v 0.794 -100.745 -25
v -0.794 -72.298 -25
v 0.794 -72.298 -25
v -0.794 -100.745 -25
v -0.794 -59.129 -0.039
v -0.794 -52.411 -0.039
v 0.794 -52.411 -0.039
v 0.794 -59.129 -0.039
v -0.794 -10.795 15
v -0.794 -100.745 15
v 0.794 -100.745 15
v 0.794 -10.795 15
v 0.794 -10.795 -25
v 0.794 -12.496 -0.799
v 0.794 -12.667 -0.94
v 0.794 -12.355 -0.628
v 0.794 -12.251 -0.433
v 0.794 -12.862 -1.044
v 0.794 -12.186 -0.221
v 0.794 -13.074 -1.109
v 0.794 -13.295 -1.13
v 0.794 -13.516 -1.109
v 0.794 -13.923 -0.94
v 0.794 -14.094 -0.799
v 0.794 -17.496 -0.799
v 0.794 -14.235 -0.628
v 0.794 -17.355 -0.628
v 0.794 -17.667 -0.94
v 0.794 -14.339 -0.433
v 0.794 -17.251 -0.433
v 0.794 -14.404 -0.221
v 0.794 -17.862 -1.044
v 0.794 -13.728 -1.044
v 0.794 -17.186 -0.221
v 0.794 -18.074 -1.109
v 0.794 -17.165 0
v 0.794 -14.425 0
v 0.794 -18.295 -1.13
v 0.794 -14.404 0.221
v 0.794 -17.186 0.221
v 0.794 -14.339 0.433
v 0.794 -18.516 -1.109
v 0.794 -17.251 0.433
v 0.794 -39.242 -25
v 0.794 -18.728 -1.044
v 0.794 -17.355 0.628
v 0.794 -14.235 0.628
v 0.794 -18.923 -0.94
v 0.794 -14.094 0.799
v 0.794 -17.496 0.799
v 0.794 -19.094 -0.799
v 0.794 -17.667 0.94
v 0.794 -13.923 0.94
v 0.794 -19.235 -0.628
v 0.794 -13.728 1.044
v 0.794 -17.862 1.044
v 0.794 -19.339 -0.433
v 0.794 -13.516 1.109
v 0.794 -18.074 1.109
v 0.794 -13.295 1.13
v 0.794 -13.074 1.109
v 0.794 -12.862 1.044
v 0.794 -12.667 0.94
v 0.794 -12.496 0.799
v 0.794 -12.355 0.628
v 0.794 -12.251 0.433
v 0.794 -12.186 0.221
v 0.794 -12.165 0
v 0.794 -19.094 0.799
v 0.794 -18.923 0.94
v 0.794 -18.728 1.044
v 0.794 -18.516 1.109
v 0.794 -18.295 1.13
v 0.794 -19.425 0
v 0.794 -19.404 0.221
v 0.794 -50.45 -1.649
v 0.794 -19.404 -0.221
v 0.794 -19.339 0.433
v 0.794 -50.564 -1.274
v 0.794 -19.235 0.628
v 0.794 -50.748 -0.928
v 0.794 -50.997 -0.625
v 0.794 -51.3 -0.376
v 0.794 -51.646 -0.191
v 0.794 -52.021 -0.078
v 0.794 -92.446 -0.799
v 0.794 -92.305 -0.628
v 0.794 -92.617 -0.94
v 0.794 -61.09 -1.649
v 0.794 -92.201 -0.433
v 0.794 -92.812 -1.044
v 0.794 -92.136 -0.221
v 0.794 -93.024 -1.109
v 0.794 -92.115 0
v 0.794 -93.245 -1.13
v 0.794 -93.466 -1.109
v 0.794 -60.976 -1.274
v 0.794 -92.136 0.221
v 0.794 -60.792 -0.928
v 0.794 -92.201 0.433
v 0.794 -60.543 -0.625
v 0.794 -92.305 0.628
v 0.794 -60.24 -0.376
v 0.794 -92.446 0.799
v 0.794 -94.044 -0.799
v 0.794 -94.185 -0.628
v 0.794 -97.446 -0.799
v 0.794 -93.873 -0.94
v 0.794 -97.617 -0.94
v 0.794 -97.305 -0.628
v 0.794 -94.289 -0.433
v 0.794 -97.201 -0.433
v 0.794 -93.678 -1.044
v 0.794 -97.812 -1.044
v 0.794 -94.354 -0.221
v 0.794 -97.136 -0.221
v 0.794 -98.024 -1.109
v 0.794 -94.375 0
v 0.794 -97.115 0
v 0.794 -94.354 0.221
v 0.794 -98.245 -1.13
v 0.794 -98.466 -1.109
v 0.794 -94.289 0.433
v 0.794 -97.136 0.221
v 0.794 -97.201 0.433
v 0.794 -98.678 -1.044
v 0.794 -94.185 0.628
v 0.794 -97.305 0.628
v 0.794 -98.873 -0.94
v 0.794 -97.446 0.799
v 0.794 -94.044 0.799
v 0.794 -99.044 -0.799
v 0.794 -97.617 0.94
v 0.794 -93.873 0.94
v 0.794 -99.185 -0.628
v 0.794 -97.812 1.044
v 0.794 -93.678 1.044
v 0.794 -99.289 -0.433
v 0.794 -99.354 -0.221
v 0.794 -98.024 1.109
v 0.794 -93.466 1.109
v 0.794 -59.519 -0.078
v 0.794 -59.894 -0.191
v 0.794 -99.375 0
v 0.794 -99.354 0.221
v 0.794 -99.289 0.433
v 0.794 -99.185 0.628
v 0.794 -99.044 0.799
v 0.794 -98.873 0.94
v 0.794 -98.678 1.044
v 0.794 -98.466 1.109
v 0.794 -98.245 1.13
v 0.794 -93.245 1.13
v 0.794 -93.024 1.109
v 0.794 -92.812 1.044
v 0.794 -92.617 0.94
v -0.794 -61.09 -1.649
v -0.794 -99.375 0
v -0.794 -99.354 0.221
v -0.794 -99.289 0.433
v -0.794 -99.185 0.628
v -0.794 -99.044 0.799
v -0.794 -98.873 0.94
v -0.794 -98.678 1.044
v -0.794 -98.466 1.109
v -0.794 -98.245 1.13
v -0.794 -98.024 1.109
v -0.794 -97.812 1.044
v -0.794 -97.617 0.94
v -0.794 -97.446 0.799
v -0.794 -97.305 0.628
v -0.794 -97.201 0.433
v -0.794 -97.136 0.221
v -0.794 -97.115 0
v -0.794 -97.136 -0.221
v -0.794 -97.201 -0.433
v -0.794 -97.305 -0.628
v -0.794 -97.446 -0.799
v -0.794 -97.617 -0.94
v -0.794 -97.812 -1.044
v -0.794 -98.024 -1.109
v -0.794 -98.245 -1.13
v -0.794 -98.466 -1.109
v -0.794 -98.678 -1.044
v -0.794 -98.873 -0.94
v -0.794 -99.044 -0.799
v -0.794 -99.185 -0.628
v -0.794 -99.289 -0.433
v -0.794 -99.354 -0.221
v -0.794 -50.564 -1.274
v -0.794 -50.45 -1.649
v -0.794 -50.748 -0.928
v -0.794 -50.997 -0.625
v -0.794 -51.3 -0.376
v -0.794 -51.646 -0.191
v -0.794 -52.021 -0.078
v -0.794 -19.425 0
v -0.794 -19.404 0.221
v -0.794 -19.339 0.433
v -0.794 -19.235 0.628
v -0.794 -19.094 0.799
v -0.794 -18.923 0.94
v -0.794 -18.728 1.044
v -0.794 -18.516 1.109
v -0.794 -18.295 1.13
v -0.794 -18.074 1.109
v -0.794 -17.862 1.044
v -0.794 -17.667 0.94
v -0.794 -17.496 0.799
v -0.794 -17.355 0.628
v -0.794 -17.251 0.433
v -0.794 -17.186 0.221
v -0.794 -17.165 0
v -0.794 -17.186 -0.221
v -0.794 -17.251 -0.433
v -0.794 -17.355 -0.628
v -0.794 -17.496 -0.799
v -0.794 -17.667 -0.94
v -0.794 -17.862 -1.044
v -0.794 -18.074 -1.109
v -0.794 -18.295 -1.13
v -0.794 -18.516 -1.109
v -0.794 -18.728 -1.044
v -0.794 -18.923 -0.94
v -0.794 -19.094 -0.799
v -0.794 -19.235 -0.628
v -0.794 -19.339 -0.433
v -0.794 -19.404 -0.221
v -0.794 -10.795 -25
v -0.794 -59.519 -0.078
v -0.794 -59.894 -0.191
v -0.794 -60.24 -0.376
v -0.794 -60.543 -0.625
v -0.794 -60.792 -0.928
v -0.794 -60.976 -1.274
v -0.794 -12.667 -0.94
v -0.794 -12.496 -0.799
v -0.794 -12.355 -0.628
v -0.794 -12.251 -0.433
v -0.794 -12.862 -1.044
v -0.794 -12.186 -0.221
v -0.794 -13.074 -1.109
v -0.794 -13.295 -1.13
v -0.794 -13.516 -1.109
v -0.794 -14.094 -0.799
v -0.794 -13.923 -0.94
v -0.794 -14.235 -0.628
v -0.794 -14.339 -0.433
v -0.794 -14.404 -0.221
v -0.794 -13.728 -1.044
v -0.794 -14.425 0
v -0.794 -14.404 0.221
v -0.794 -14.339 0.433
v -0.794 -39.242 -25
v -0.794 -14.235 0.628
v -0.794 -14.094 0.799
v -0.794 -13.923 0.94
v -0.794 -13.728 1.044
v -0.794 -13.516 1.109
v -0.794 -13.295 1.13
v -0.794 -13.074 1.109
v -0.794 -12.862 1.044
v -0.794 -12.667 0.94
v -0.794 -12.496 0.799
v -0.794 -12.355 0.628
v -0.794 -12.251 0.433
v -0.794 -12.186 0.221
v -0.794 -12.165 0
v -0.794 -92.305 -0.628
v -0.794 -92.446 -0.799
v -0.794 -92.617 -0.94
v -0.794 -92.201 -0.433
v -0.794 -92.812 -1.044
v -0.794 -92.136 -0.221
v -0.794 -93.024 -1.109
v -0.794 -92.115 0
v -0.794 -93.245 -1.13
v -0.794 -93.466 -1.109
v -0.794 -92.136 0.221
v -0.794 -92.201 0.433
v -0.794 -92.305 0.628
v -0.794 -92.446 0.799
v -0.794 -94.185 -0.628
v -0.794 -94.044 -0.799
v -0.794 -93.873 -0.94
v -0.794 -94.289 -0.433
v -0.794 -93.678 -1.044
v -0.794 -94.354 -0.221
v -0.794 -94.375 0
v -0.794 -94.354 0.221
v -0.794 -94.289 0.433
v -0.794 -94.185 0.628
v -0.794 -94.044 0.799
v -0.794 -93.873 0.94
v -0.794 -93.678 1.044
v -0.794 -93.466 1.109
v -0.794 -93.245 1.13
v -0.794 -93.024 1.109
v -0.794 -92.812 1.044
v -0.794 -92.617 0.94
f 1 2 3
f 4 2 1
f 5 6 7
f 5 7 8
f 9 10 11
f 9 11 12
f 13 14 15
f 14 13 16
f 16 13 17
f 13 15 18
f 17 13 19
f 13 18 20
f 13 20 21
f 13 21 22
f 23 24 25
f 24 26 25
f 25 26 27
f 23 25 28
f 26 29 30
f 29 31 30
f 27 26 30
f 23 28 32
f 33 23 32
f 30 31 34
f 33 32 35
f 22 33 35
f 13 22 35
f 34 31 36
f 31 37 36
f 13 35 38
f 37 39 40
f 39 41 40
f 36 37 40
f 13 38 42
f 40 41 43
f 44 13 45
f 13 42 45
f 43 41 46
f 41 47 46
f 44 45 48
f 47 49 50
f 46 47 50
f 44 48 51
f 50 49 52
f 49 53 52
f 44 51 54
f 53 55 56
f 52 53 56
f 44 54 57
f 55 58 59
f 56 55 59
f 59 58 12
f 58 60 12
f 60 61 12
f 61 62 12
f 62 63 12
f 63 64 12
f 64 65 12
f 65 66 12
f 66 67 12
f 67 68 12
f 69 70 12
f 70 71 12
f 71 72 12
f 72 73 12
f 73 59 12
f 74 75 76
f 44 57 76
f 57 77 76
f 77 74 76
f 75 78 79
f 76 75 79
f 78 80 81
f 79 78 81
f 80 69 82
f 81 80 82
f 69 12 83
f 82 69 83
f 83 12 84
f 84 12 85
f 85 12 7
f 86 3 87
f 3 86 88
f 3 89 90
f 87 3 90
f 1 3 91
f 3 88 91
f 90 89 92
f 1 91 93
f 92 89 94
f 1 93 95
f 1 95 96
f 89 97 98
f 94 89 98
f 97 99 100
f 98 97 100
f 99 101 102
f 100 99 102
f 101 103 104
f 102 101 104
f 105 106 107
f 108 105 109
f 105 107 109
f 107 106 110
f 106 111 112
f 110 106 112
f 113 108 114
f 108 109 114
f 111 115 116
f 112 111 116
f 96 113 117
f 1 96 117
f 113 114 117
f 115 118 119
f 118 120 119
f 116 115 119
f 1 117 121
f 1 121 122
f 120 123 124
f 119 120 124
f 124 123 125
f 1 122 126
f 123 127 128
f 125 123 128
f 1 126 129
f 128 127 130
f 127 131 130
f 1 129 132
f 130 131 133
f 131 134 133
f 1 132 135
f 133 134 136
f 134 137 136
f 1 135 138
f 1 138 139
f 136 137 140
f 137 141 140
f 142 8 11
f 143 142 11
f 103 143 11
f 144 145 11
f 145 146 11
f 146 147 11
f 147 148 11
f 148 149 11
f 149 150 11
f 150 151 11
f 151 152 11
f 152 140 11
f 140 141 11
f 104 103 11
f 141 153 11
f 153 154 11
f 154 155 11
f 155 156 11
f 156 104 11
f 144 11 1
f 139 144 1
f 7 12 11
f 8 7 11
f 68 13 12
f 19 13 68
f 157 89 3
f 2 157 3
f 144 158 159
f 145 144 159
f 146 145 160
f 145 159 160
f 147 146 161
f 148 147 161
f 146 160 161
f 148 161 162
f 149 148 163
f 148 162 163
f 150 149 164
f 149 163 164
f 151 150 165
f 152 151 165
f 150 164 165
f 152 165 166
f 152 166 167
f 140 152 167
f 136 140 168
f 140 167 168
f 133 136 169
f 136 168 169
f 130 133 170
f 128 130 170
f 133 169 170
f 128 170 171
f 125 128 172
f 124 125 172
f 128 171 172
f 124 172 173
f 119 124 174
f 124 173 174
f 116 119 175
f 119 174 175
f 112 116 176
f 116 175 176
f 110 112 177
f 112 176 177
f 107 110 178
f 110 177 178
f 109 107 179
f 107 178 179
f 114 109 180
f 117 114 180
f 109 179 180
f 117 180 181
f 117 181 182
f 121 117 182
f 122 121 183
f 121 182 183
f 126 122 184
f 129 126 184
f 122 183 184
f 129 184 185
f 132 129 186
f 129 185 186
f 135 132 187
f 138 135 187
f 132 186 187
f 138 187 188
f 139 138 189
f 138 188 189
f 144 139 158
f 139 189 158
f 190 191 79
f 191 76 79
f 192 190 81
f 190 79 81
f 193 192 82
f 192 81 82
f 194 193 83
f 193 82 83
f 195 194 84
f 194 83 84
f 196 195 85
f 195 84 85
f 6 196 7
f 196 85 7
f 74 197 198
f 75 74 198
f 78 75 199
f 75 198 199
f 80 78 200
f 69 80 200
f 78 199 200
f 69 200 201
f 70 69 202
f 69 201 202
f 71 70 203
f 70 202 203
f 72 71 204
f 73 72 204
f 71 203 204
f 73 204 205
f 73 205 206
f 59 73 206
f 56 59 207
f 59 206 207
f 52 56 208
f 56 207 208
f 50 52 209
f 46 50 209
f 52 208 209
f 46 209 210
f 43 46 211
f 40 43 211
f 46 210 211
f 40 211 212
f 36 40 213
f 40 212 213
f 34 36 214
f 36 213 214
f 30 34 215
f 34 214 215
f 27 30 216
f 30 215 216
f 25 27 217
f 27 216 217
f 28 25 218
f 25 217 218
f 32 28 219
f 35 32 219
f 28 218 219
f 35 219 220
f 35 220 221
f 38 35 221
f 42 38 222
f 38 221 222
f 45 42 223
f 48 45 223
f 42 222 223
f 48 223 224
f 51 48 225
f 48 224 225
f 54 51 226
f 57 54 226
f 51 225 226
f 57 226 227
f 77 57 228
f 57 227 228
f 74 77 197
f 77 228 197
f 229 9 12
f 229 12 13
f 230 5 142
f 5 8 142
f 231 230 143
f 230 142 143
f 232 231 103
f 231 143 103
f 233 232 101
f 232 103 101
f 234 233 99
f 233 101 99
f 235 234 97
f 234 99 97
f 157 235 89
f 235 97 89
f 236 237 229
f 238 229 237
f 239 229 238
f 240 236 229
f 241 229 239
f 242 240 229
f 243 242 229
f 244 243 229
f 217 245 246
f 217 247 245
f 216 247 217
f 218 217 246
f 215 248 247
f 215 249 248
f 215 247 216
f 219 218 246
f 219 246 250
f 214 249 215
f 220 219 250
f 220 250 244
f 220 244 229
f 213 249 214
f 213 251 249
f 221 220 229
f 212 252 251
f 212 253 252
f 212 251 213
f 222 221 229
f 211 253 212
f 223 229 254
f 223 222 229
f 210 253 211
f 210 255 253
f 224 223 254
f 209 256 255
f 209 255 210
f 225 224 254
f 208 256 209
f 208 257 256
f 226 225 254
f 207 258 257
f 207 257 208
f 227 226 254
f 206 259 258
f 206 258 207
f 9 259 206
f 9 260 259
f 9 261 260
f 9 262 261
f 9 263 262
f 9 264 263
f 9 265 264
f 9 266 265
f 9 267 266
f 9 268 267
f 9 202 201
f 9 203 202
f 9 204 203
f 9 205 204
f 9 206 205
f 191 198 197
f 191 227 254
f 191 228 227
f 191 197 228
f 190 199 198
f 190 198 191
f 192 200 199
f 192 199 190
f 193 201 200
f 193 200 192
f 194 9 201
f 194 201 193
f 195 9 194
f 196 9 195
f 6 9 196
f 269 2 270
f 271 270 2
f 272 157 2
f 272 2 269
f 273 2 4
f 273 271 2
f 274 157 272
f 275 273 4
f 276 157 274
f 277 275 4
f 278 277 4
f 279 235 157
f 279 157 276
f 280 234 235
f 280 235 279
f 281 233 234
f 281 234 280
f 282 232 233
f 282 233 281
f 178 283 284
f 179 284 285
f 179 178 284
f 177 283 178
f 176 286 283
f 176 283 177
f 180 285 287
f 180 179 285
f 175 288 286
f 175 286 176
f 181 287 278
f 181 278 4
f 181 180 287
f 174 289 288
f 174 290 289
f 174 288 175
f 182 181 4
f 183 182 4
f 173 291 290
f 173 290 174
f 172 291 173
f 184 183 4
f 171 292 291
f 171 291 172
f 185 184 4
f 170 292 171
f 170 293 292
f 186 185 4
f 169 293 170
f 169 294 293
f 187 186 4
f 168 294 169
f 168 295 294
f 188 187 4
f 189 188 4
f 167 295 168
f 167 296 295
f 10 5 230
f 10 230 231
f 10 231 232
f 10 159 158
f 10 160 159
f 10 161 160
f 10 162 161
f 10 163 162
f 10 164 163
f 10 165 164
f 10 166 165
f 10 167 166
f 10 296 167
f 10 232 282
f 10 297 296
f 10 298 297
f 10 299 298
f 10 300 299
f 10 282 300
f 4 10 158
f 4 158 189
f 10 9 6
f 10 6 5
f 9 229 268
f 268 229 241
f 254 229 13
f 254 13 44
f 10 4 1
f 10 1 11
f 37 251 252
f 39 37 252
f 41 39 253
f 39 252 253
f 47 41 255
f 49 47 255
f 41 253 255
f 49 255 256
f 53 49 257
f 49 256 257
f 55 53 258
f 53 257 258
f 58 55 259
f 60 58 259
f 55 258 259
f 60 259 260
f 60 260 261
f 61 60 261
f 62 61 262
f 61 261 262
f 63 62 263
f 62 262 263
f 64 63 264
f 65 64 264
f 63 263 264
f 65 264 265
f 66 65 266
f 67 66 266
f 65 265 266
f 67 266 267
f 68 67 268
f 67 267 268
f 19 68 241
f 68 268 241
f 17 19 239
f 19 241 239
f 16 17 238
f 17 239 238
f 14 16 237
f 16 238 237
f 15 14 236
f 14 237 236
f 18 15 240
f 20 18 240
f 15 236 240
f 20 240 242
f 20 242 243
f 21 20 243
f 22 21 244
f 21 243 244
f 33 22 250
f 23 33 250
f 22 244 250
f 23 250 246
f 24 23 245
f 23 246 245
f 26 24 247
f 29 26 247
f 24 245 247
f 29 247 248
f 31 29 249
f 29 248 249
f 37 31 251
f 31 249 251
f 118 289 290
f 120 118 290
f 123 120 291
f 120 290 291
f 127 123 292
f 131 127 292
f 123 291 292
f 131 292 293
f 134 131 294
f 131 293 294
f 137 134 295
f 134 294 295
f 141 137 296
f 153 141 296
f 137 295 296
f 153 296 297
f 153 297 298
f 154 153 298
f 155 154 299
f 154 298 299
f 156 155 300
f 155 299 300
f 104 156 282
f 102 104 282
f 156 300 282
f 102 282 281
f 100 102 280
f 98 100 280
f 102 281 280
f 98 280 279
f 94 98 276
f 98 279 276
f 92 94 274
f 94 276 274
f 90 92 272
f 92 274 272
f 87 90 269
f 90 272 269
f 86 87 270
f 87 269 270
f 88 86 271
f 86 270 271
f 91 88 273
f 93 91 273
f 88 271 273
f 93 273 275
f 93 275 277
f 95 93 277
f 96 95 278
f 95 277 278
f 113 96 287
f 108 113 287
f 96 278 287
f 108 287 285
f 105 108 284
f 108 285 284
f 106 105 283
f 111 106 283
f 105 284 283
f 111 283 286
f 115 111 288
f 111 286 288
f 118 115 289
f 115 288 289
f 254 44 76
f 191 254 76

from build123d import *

# Parameters (mm, degrees)
SKETCH_1_R          = 1.1303
EXTRUDE_1_DEPTH     = 1.588
FILLET_1_R          = 2
FILLET_2_R          = 2
FILLET_3_R          = 2
FILLET_4_R          = 2
SKETCH_2_W          = 12
SKETCH_2_H          = 89.95
EXTRUDE_2_DEPTH     = 1.588
CUT_EXTRUDE_1_DEPTH = 10


with BuildPart() as part:
    # 草图1 → 凸台-拉伸1 (new body)
    with BuildSketch(Plane(origin=(-0.79375, 0, 0), x_dir=(0, -1, 0), z_dir=(-1, 0, 0))):
        with BuildLine():
            Line((38.795, 5), (12.795, 5))
            ThreePointArc((12.795, 5), (11.380786438, 4.414213562), (10.795, 3))
            Line((10.795, 3), (10.795, -13))
            ThreePointArc((10.795, -13), (11.380786438, -14.414213562), (12.795, -15))
            Line((12.795, -15), (47.795, -15))
            Line((47.795, -15), (50.77, -0.039144756))
            Line((50.77, -0.039144756), (55.77, -0.039144756))
            Line((55.77, -0.039144756), (60.77, -0.039144756))
            Line((60.77, -0.039144756), (63.745, -15))
            Line((63.745, -15), (98.745, -15))
            ThreePointArc((98.745, -15), (100.159213562, -14.414213562), (100.745, -13))
            Line((100.745, -13), (100.745, 3))
            ThreePointArc((100.745, 3), (100.159213562, 4.414213562), (98.745, 5))
            Line((98.745, 5), (72.745, 5))
            Line((72.745, 5), (38.795, 5))
        make_face()
        with Locations((18.295, 0)):
            Circle(SKETCH_1_R, mode=Mode.SUBTRACT)
        with Locations((13.295, 0)):
            Circle(SKETCH_1_R, mode=Mode.SUBTRACT)
        with Locations((98.245, 0)):
            Circle(SKETCH_1_R, mode=Mode.SUBTRACT)
        with Locations((93.245, 0)):
            Circle(SKETCH_1_R, mode=Mode.SUBTRACT)
    extrude(amount=-EXTRUDE_1_DEPTH)

    # 圆角1
    fillet_1_edges = [part.edges().sort_by_distance(p)[0] for p in [
        (0.00025, -50.77, -0.039144756),
    ]]
    fillet(fillet_1_edges, radius=FILLET_1_R)

    # 圆角2
    fillet_2_edges = [part.edges().sort_by_distance(p)[0] for p in [
        (0.00025, -47.795, -15),
    ]]
    fillet(fillet_2_edges, radius=FILLET_2_R)

    # 圆角3
    fillet_3_edges = [part.edges().sort_by_distance(p)[0] for p in [
        (0.00025, -60.77, -0.039144756),
    ]]
    fillet(fillet_3_edges, radius=FILLET_3_R)

    # 圆角4
    fillet_4_edges = [part.edges().sort_by_distance(p)[0] for p in [
        (0.00025, -63.745, -15),
    ]]
    fillet(fillet_4_edges, radius=FILLET_4_R)

    # 草图2 → 凸台-拉伸2 (add)
    with BuildSketch(Plane.ZY.offset(0.79375)):
        with Locations((9, -55.77)):
            Rectangle(SKETCH_2_W, SKETCH_2_H)
        Polygon((-25, -10.795), (-25, -45.806477318), (-13.39006724, -48.115138781), (-13, -10.795), align=None)
        Polygon((-13.39006724, -63.424861219), (-25, -65.733522682), (-25, -100.745), (-13, -100.745), align=None)
    extrude(amount=-EXTRUDE_2_DEPTH)

    # 草图5 → 切除-拉伸1 (cut)
    with BuildSketch(Plane(origin=(0.79425, 0, 0), x_dir=(0, 0, -1), z_dir=(1, 0, 0))):
        Polygon((1.649077515, -50.449861219), (25, -45.806477318), (25, -39.241825321), align=None)
        Polygon((25, -72.298174679), (25, -65.733522682), (1.649077515, -61.090138781), align=None)
    extrude(amount=-CUT_EXTRUDE_1_DEPTH, mode=Mode.SUBTRACT)


solid = part.part
